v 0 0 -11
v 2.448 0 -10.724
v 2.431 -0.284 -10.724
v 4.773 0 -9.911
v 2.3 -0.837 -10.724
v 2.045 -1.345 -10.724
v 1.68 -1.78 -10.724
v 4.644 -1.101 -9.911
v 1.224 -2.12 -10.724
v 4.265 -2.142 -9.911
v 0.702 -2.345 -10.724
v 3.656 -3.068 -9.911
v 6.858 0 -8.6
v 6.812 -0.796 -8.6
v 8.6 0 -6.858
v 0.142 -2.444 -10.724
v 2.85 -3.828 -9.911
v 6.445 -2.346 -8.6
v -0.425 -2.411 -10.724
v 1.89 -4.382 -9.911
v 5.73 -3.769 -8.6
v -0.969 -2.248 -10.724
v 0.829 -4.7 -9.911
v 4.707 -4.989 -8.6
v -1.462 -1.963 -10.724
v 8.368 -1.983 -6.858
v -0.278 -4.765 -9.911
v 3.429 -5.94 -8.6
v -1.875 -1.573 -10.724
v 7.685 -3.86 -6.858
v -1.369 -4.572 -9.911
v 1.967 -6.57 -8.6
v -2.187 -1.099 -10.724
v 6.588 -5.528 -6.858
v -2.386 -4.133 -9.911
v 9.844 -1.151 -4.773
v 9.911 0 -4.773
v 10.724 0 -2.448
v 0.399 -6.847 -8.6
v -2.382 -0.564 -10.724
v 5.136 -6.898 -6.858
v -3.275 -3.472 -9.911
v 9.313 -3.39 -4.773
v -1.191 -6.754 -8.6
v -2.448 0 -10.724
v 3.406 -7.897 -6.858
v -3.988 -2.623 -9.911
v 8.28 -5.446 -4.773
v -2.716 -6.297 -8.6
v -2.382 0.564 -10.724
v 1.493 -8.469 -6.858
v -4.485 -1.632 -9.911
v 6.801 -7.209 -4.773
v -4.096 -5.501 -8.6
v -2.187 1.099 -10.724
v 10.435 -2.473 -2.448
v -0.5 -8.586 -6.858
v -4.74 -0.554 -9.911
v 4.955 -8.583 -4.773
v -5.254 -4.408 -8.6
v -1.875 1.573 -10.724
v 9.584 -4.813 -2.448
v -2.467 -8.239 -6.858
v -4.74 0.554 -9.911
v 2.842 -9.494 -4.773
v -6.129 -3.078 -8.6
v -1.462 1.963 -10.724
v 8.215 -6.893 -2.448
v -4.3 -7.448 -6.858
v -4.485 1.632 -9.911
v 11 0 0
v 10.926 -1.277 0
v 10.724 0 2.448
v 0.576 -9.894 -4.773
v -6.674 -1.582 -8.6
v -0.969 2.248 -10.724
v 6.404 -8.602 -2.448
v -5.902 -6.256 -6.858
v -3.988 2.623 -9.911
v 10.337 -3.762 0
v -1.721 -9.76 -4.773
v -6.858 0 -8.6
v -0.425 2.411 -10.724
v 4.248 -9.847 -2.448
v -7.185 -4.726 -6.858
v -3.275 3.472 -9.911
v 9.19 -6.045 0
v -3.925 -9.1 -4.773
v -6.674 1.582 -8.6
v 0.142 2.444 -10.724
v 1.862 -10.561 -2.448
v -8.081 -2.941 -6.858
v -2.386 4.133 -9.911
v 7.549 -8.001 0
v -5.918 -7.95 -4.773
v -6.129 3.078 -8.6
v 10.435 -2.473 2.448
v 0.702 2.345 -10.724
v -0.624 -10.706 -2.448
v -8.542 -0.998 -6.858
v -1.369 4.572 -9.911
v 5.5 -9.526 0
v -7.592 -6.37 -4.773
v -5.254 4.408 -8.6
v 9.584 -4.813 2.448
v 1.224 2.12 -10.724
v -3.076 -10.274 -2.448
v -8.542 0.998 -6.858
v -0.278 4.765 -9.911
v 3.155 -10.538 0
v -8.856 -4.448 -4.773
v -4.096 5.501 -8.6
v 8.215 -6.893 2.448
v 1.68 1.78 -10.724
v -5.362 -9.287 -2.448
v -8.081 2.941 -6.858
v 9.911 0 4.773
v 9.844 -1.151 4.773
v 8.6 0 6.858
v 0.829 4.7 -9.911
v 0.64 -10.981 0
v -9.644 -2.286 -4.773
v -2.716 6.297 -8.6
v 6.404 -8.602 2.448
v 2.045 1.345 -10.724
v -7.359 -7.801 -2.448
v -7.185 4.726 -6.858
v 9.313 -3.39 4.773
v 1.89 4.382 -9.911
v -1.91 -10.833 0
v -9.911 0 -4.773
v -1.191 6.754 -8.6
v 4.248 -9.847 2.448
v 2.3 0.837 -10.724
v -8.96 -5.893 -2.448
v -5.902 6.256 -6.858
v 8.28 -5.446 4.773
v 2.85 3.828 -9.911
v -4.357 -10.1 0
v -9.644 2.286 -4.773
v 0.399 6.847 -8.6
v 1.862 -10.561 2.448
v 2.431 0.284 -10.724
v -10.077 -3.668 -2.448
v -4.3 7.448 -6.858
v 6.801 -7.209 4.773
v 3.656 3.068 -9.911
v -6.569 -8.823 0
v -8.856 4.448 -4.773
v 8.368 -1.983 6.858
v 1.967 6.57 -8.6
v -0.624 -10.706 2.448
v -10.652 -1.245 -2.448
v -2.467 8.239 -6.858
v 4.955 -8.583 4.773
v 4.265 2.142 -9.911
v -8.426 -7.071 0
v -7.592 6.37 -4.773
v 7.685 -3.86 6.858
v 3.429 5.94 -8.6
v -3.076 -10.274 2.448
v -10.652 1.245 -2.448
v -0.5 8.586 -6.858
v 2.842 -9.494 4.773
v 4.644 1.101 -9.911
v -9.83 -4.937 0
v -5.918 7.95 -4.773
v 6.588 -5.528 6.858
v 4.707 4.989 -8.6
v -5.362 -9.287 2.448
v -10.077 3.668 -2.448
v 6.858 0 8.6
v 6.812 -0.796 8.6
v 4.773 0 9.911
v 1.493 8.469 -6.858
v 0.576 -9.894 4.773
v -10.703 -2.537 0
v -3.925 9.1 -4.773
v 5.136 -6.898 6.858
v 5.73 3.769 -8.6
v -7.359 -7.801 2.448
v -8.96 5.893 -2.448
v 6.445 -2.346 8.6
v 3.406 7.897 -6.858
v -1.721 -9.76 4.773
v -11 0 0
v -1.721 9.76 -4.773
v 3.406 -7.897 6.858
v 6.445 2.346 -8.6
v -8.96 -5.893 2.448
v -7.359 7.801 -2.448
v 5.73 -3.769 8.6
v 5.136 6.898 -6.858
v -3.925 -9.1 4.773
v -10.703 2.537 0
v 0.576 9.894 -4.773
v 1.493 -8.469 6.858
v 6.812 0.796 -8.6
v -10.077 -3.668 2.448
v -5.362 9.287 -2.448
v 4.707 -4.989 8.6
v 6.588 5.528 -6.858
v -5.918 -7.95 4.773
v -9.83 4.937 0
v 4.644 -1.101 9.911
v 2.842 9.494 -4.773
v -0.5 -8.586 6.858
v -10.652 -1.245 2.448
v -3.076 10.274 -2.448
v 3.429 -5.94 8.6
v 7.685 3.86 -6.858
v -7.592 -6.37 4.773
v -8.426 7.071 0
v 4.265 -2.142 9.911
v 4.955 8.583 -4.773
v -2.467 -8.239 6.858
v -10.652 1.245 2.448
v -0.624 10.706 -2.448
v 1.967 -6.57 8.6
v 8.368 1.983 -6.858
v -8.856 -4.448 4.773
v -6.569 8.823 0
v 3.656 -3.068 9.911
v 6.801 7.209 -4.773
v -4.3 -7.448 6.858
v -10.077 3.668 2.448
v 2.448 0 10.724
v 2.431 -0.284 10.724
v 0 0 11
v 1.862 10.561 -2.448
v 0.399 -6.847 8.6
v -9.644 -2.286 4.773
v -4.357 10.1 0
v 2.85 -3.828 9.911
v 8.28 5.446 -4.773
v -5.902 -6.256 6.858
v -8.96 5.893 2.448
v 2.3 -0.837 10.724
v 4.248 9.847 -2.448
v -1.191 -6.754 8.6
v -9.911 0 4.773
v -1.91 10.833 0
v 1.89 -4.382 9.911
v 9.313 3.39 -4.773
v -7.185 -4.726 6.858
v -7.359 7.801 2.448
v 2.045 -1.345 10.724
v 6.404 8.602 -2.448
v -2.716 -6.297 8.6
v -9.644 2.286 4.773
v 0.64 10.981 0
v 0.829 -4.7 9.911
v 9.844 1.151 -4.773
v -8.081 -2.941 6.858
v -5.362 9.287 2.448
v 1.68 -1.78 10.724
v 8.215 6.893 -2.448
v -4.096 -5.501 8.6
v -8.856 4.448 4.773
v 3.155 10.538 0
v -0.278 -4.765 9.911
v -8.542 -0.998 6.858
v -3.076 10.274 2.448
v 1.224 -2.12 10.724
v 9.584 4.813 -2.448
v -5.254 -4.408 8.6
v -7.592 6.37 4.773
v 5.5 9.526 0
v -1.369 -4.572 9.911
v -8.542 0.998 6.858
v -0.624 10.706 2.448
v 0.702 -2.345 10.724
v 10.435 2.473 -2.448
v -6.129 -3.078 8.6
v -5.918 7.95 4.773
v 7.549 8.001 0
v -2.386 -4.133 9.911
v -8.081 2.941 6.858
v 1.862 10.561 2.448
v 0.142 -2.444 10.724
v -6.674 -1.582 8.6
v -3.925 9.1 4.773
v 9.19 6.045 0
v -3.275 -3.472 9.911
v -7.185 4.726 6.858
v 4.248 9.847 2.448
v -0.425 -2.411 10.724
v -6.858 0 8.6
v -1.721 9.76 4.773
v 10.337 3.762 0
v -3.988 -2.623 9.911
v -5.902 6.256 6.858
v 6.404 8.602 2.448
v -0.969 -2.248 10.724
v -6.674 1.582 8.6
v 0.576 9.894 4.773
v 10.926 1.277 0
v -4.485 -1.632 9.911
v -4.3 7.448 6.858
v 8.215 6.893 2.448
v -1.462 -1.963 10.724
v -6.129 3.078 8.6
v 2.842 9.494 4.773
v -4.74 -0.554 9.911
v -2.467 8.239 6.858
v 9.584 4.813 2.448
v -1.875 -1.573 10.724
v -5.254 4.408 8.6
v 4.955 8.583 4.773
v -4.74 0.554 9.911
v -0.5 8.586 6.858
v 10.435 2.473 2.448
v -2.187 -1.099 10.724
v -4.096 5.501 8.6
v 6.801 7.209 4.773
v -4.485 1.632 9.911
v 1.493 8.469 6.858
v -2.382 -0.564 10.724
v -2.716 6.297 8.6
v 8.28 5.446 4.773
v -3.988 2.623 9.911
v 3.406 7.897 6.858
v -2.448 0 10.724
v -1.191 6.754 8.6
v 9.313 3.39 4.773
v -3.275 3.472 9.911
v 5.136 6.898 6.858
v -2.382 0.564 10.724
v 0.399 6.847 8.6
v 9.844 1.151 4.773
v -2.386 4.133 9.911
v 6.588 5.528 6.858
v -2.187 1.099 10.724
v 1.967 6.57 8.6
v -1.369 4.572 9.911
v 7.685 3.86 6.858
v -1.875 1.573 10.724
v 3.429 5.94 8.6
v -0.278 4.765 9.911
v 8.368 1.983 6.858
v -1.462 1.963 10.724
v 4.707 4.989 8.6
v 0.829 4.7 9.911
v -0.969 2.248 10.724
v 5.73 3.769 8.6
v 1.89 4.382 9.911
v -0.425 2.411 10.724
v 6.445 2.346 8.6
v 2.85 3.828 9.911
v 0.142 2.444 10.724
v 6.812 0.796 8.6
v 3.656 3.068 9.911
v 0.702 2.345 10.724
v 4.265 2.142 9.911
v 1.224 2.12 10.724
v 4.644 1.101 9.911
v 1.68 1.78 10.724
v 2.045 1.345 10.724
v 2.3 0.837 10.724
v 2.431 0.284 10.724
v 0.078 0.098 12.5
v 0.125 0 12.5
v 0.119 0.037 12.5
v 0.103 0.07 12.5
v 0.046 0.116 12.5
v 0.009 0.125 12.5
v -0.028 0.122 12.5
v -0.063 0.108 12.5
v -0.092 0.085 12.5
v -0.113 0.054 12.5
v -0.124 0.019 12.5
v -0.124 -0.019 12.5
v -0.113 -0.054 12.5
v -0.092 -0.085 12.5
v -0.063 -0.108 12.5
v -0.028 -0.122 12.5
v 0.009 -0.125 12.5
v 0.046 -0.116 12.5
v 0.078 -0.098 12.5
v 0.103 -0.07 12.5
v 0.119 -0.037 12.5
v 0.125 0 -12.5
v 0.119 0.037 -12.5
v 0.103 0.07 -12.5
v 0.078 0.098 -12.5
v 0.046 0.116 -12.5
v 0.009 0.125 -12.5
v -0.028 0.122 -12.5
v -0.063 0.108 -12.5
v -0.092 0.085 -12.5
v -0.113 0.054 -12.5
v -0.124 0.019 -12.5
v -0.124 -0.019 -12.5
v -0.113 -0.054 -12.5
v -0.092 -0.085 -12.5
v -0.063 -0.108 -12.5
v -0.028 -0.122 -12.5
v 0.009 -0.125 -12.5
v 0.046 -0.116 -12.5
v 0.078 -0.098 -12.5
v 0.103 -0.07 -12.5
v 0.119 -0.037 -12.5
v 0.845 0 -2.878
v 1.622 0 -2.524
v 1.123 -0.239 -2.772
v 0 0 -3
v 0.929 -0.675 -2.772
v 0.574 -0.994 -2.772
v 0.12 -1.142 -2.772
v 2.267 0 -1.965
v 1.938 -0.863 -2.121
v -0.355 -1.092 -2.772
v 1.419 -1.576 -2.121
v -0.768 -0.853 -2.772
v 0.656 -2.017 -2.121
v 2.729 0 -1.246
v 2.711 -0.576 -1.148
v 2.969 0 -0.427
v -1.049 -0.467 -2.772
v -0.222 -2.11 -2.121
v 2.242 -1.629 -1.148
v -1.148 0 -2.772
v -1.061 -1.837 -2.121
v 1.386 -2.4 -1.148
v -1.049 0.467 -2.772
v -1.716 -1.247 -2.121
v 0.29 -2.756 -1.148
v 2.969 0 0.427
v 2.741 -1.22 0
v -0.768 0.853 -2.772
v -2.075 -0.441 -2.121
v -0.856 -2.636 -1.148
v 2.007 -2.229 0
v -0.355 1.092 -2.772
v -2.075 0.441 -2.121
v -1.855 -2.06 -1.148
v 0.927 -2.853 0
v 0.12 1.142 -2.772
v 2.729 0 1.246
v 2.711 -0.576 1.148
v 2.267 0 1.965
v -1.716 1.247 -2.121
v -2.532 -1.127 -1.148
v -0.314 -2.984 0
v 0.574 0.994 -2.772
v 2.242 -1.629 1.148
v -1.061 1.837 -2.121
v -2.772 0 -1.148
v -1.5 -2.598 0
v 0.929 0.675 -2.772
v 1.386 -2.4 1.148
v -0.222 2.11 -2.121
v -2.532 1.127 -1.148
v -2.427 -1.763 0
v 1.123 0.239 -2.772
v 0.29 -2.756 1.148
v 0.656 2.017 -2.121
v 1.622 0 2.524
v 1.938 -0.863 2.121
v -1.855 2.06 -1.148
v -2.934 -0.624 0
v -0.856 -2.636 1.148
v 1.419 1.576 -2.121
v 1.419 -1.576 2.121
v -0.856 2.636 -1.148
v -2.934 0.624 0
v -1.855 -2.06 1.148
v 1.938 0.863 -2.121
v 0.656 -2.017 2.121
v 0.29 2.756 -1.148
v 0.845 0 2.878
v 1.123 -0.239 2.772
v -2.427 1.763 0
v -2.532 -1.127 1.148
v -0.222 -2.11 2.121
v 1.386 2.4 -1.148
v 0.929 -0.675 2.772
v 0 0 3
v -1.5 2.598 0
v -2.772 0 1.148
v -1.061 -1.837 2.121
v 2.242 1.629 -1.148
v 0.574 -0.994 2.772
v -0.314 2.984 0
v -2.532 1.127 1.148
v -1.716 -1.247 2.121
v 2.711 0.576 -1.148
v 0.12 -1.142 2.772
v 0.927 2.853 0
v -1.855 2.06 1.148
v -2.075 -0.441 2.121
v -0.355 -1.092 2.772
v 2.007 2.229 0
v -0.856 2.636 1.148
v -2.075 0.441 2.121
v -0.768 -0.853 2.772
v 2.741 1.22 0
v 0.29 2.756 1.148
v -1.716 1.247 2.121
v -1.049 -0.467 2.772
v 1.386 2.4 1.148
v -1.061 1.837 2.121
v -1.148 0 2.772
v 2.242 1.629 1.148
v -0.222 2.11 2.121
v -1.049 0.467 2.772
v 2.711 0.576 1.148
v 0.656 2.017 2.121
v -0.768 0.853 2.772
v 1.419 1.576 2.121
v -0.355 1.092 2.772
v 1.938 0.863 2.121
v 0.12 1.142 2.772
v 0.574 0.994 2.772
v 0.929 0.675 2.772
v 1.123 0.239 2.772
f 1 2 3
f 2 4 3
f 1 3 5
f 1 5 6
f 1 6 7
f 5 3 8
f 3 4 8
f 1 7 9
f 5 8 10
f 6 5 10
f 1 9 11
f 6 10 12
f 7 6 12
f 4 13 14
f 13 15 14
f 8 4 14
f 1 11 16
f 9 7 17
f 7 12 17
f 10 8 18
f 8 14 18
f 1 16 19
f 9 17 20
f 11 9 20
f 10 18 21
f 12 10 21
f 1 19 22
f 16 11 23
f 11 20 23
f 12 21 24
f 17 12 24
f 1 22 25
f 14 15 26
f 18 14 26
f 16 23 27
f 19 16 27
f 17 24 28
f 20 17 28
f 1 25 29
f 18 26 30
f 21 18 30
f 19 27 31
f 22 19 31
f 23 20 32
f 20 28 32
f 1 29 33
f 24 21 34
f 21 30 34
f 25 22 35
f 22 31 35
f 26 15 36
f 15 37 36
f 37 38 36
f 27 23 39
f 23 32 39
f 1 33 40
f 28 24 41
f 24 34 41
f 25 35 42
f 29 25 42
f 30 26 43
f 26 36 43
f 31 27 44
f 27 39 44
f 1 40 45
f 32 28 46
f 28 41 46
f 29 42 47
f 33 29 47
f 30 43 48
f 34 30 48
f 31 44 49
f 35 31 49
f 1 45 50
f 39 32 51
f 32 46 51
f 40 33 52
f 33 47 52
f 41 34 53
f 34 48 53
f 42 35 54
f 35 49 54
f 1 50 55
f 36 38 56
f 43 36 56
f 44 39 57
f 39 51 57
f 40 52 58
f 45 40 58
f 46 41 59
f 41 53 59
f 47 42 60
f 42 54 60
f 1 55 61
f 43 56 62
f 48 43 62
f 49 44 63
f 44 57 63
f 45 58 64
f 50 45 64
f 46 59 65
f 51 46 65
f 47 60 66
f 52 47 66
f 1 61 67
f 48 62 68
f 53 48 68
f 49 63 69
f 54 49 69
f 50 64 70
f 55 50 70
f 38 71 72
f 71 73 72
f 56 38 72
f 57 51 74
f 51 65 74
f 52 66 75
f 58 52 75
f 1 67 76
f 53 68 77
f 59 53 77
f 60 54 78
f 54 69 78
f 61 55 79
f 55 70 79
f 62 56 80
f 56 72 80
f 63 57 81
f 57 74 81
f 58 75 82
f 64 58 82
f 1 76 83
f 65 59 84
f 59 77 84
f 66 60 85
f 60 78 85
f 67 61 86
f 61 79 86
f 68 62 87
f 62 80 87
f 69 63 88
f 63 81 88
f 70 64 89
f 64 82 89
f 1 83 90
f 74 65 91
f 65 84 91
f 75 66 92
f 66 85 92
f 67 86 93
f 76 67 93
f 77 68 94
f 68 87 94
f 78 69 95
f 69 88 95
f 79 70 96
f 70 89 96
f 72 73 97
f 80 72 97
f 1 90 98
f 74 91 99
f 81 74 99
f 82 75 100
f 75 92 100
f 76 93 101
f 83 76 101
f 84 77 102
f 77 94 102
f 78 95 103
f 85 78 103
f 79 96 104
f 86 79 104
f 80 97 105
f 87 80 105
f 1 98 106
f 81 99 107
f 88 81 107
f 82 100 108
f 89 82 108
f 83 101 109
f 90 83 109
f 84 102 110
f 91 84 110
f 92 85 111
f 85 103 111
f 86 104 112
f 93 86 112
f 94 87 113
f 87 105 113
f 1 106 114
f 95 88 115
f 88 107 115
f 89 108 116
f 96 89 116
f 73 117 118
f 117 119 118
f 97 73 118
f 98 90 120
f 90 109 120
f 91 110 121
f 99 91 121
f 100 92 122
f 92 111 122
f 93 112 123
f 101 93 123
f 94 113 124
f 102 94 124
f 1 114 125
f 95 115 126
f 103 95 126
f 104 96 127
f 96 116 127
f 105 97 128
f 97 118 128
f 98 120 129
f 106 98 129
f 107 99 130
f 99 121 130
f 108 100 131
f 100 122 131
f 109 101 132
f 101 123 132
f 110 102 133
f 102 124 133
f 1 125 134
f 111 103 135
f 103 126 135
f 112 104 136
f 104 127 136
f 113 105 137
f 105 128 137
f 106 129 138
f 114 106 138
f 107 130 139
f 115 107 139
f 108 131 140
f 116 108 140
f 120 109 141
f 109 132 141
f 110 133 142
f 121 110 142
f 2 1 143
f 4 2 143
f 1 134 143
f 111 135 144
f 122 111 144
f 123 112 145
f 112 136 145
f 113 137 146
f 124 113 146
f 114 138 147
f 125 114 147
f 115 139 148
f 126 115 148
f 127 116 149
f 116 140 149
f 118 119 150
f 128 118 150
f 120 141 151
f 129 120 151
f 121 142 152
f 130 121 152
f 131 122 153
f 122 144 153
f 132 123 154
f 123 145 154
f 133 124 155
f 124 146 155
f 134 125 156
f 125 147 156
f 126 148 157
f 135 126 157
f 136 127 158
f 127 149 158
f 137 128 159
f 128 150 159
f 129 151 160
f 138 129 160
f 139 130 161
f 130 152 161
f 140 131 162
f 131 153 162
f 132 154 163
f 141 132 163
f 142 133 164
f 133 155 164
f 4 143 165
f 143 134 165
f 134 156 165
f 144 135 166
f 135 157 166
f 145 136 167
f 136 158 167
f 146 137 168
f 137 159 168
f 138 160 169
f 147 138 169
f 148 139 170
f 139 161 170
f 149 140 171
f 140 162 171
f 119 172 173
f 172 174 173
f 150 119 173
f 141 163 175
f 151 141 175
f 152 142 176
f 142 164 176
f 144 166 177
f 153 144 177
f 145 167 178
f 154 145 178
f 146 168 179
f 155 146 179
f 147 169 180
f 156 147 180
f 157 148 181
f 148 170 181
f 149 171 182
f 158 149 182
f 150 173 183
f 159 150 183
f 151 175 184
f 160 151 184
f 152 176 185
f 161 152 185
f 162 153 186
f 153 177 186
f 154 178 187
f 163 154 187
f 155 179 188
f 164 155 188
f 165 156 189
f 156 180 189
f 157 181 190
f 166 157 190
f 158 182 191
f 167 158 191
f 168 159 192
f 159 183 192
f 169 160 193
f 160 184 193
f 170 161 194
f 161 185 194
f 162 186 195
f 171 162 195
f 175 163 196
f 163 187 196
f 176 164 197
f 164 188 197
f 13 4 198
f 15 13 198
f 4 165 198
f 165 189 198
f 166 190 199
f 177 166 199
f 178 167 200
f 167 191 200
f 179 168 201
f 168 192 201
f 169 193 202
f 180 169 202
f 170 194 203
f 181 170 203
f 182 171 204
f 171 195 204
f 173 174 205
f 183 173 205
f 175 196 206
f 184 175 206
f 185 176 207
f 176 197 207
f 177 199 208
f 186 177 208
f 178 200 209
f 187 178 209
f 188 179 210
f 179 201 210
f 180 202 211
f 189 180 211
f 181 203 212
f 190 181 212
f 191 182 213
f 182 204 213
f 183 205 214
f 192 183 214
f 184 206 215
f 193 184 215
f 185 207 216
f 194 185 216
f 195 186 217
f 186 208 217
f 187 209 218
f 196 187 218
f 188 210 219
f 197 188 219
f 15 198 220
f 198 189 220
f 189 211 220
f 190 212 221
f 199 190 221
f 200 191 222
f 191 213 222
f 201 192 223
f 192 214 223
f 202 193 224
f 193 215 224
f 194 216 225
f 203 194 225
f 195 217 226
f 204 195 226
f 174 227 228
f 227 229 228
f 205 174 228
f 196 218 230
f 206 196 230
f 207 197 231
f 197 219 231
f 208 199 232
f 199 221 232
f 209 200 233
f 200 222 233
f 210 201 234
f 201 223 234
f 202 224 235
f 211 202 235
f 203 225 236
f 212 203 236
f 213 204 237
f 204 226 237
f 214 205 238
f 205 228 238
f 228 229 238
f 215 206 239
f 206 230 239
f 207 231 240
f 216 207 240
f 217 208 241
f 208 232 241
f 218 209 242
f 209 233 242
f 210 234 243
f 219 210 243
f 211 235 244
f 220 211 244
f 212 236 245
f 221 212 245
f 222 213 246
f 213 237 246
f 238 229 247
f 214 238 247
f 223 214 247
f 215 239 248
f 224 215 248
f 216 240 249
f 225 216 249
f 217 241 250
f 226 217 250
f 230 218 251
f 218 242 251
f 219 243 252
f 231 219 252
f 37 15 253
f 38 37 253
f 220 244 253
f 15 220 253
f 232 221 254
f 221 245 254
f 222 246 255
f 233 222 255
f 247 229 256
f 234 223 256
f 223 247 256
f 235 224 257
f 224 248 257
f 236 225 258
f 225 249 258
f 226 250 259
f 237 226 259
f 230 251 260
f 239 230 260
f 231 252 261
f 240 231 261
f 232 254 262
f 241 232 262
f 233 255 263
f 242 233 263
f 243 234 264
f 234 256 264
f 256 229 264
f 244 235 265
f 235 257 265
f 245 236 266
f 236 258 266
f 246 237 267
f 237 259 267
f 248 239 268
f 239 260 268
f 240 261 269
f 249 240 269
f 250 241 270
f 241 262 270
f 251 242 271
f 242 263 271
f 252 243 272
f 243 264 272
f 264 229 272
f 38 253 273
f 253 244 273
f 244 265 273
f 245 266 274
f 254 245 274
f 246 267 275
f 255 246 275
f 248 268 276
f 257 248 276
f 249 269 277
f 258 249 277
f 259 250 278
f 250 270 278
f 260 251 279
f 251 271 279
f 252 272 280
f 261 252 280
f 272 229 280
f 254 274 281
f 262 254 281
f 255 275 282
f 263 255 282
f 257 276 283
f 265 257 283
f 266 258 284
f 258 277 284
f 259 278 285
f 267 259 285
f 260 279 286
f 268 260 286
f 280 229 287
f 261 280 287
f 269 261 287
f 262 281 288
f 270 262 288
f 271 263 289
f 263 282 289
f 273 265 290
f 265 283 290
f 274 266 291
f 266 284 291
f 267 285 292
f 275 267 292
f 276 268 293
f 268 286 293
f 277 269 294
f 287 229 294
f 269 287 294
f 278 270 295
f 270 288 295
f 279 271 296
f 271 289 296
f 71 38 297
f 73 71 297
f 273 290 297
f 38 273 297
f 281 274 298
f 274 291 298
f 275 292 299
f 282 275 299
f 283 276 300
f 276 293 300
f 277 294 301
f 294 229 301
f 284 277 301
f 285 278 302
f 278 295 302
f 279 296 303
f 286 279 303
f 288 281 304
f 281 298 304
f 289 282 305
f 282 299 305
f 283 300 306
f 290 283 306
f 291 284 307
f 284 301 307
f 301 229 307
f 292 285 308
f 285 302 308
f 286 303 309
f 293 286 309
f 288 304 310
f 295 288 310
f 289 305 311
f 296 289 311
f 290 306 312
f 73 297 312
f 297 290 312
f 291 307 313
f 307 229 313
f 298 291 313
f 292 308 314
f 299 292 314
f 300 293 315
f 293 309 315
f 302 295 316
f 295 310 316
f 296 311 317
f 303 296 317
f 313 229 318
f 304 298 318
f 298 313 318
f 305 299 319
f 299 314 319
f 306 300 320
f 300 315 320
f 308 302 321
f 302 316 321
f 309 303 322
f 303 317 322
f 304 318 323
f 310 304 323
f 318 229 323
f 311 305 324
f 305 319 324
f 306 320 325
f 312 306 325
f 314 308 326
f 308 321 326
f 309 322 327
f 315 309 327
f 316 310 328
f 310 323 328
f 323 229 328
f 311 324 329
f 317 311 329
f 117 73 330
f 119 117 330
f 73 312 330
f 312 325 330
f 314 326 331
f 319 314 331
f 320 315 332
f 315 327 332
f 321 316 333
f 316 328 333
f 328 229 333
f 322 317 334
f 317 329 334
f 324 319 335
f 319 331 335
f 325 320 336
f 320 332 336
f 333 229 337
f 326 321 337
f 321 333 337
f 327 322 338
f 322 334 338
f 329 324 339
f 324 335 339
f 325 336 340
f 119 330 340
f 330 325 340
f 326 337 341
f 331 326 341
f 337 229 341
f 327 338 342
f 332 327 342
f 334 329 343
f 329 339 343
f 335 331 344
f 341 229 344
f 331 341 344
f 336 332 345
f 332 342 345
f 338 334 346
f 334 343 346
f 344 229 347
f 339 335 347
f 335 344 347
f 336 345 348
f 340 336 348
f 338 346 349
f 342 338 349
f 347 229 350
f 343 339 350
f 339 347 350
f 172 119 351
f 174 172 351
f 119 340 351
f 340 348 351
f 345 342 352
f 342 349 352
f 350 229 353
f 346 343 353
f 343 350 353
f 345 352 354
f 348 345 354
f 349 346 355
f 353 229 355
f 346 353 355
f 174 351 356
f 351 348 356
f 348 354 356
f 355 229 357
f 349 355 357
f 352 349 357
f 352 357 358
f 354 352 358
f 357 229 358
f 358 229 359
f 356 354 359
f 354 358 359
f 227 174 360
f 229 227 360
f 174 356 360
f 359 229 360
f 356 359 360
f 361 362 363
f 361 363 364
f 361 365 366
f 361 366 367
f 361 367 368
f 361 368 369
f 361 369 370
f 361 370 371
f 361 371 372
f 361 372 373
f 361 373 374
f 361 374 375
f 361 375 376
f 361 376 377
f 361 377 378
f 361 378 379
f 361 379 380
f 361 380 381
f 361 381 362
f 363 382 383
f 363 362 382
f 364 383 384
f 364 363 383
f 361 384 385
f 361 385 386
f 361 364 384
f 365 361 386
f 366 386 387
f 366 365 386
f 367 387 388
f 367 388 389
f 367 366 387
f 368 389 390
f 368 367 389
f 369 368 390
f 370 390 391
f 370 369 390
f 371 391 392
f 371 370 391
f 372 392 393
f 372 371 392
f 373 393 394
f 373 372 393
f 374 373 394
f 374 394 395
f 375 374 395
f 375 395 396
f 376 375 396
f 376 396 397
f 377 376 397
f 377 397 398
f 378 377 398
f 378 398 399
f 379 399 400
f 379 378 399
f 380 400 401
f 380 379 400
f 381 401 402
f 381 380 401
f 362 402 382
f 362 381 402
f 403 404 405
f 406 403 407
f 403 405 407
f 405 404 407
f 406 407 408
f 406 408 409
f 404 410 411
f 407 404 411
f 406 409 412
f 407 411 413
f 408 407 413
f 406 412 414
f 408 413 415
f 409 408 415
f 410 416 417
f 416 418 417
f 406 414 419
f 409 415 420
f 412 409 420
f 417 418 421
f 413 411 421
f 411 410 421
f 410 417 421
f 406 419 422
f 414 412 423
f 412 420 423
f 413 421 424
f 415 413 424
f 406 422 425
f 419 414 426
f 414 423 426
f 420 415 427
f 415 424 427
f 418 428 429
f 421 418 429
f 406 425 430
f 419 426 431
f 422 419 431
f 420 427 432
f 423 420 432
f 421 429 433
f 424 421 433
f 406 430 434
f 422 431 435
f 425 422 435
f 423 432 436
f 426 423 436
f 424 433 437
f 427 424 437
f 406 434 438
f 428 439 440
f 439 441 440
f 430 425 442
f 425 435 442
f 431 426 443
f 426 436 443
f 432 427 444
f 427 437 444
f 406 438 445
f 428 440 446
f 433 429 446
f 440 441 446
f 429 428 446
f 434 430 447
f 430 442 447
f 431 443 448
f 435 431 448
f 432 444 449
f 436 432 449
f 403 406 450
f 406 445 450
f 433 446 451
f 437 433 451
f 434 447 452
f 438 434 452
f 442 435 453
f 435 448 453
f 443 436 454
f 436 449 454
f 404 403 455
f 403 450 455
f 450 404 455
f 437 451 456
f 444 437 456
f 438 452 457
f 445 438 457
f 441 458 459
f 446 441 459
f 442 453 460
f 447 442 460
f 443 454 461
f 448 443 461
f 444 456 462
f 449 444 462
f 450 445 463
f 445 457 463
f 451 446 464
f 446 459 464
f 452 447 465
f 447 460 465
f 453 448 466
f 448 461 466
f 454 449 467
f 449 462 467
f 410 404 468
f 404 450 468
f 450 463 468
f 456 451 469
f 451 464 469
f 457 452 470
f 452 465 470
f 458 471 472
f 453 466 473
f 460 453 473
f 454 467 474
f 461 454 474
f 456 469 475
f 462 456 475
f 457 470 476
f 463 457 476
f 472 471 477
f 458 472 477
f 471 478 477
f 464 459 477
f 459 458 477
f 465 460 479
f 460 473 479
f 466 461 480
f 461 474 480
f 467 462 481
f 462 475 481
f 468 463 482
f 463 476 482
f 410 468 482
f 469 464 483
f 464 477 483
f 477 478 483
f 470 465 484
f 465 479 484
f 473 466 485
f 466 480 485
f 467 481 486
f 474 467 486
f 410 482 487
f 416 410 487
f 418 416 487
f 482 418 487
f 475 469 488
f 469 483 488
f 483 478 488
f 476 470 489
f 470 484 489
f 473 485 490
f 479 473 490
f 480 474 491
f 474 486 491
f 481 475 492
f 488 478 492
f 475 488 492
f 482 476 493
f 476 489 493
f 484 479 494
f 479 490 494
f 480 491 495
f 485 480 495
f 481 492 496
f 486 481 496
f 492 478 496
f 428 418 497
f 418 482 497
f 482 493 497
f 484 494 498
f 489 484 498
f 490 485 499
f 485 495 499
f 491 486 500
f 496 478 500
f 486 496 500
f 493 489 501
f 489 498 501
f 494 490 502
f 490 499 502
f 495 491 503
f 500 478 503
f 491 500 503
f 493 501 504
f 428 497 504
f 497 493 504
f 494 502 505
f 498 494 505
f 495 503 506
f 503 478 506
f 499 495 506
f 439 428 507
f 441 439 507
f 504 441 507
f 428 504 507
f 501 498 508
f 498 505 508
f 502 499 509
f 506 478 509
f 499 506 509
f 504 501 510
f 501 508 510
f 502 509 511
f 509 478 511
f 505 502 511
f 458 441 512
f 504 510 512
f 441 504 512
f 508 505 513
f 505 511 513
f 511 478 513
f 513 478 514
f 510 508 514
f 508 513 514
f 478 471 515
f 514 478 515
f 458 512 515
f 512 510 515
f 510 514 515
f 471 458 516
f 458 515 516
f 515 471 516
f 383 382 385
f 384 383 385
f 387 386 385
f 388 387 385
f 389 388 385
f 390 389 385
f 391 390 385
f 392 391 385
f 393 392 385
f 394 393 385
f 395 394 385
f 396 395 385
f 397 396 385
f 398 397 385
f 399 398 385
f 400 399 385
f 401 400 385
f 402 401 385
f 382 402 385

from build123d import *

# Parameters (mm, degrees)
F4_R     = 0.125
F5_DEPTH = 12.5


with BuildPart() as f1:
    # F0 (on Front) → F1 (revolve)
    with BuildSketch(Plane.XZ):
        with BuildLine():
            ThreePointArc((0, -11), (11, 0), (0, 11))
            Line((0, 11), (0, -11))
        make_face()
    revolve(axis=Axis((0, 0, 0.4714287959), (0, 0, -1)))


with BuildPart() as f3:
    # F2 (on Front) → F3 (revolve)
    with BuildSketch(Plane.XZ):
        with BuildLine():
            ThreePointArc((0, -3), (3, 0), (0, 3))
            Line((0, 3), (0, -3))
        make_face()
    revolve(axis=Axis((0, 0, 0.0618835911), (0, 0, -1)))


with BuildPart() as f5:
    # F4 (on Top) → F5 (new body, symmetric)
    with BuildSketch(Plane.XY):
        Circle(F4_R)
    extrude(amount=F5_DEPTH, both=True)


solid = Compound([f1.part, f3.part, f5.part])
